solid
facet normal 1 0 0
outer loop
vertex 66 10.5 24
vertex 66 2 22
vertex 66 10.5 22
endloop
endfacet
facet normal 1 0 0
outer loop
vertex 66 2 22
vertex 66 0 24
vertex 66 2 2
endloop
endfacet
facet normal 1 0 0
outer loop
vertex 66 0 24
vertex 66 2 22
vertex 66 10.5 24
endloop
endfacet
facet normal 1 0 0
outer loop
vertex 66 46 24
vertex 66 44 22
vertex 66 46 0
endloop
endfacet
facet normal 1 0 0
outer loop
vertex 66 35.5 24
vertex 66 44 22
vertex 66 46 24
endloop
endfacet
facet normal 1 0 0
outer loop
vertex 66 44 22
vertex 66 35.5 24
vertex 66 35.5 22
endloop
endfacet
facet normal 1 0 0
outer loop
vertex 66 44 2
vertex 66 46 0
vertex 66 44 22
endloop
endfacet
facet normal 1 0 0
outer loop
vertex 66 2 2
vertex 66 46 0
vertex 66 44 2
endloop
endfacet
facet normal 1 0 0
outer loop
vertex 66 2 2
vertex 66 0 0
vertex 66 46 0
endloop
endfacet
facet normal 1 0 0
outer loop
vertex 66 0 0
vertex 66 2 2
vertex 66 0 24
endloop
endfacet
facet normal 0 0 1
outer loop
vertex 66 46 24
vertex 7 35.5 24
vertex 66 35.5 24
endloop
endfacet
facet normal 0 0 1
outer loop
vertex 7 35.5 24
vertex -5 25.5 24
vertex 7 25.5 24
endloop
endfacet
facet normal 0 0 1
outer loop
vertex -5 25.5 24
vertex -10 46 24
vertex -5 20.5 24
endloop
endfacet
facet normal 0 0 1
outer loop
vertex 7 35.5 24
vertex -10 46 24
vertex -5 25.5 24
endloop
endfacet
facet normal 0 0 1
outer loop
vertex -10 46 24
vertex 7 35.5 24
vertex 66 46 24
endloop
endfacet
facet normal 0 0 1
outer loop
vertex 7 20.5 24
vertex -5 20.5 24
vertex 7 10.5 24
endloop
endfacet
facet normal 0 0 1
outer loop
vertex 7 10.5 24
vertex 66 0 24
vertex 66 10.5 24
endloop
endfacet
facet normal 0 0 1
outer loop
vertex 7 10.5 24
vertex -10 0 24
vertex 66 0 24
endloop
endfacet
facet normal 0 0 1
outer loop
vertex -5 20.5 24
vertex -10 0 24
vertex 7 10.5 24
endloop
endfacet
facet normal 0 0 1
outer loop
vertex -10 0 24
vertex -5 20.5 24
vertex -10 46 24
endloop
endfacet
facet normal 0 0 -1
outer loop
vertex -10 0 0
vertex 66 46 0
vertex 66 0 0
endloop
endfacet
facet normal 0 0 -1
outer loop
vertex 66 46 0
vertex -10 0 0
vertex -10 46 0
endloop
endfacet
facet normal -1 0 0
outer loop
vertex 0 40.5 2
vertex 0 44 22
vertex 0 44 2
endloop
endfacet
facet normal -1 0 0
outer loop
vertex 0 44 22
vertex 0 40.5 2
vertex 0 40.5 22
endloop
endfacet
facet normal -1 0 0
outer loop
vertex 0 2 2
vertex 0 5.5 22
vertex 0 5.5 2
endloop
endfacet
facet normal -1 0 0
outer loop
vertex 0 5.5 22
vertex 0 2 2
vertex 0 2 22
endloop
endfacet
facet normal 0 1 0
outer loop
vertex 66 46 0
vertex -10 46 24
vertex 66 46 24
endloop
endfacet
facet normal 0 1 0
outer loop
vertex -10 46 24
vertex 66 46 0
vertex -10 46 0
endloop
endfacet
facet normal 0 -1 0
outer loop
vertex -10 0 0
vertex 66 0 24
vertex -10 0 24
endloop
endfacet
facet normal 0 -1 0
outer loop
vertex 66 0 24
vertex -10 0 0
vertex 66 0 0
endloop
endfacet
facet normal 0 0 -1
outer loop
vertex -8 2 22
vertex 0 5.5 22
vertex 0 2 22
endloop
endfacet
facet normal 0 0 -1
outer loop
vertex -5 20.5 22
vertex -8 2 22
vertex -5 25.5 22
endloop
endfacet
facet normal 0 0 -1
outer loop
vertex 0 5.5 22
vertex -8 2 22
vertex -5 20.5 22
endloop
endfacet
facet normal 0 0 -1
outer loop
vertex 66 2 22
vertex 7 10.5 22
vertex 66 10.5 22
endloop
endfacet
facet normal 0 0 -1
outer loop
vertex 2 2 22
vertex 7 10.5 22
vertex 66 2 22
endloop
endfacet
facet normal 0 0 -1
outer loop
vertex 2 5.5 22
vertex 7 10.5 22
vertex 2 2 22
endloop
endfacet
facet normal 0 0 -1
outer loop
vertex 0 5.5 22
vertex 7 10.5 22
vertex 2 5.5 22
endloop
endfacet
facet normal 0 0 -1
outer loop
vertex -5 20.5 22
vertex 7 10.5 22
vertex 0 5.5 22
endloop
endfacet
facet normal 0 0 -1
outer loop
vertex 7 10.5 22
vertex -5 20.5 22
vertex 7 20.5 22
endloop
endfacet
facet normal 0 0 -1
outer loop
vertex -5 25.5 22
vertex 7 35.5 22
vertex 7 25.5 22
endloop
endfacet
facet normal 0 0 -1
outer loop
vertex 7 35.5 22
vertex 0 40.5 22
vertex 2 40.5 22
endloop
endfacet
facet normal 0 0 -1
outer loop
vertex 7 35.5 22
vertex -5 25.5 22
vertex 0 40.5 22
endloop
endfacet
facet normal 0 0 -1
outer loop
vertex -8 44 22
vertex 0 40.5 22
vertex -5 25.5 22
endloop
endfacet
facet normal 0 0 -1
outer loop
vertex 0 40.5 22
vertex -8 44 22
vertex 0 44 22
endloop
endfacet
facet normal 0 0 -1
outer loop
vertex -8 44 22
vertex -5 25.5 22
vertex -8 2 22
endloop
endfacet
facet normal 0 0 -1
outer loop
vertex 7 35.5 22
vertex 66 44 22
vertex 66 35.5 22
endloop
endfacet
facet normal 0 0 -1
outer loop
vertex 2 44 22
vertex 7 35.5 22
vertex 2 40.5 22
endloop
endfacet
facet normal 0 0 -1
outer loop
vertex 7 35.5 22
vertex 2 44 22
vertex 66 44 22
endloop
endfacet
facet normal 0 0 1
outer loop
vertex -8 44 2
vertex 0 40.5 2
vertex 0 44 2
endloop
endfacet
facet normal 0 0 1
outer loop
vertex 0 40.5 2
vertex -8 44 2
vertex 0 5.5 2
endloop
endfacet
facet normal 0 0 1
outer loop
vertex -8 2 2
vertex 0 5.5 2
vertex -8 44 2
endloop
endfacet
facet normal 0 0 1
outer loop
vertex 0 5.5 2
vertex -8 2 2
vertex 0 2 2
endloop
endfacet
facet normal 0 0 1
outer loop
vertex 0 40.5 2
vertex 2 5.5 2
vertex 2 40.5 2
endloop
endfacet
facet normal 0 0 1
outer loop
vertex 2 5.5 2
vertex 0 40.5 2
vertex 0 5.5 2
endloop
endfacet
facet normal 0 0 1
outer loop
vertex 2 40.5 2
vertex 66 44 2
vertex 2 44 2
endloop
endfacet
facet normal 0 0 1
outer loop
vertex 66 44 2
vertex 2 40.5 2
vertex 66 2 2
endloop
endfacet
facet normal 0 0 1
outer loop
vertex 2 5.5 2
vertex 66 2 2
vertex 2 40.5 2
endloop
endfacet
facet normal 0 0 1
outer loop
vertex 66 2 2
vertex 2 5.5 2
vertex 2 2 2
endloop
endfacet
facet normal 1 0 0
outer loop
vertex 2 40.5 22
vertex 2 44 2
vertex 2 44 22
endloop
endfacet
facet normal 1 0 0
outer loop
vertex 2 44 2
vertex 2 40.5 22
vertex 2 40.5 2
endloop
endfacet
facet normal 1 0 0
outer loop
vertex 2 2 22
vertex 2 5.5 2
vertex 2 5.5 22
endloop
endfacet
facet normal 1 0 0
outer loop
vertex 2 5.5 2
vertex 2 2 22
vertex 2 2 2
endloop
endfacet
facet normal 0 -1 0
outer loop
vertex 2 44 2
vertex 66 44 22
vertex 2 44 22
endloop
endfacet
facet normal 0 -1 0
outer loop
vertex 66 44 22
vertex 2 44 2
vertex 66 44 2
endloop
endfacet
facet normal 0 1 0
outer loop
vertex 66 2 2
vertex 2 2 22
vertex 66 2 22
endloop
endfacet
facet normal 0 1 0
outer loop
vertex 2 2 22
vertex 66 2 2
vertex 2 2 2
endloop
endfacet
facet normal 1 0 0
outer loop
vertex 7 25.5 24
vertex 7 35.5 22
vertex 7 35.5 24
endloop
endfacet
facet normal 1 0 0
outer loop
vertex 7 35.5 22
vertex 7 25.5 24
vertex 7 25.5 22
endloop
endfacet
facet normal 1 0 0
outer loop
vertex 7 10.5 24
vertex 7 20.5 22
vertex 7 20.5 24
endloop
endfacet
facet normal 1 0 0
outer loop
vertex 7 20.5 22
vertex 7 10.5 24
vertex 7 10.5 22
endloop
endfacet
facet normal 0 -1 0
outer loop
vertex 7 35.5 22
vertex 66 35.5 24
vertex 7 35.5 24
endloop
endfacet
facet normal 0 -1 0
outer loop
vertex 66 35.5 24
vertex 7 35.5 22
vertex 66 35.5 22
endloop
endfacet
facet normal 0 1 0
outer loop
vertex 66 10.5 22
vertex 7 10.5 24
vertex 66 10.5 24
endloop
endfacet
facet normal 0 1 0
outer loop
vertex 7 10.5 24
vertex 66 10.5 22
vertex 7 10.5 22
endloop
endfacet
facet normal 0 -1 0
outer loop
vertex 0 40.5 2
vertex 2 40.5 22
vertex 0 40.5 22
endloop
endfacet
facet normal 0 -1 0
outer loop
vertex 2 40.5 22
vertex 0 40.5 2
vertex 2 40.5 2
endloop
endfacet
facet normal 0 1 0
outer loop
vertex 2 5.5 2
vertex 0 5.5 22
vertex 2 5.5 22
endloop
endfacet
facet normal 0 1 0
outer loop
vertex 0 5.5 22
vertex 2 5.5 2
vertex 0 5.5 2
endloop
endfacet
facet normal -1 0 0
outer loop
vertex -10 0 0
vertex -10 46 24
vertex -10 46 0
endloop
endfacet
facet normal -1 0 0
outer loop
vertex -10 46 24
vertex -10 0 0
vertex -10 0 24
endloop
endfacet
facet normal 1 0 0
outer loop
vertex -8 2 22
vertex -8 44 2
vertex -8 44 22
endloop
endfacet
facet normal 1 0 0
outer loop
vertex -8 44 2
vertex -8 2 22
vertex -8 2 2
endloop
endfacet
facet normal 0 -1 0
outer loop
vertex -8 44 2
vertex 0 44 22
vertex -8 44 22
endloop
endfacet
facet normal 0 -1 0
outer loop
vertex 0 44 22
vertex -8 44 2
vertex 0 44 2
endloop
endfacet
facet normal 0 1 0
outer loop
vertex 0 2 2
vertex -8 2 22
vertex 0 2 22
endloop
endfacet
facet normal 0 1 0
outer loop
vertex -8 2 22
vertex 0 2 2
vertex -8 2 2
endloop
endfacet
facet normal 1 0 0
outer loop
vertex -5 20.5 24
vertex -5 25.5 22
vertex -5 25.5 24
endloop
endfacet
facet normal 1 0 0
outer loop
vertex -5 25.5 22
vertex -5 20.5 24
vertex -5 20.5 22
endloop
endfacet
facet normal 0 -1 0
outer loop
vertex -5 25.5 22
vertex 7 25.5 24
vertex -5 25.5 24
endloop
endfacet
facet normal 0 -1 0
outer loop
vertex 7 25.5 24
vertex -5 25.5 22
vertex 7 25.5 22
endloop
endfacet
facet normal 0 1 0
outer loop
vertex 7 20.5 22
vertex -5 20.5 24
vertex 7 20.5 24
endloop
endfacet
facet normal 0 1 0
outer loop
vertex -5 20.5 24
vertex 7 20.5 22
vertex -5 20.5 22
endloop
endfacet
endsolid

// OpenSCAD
// file: ../_common/roundedcube.scad
// More information: https://danielupshaw.com/openscad-rounded-corners/
// Higher definition curves
$fs = 0.01;

module roundedcube(size = [1, 1, 1], center = false, radius = 0.5, apply_to = "all") {
	// If single value, convert to [x, y, z] vector
	size = (size[0] == undef) ? [size, size, size] : size;

	translate_min = radius;
	translate_xmax = size[0] - radius;
	translate_ymax = size[1] - radius;
	translate_zmax = size[2] - radius;

	diameter = radius * 2;

	module build_point(type = "sphere", rotate = [0, 0, 0]) {
		if (type == "sphere") {
			sphere(r = radius);
		} else if (type == "cylinder") {
			rotate(a = rotate)
			cylinder(h = diameter, r = radius, center = true);
		}
	}

	obj_translate = (center == false) ?
		[0, 0, 0] : [
			-(size[0] / 2),
			-(size[1] / 2),
			-(size[2] / 2)
		];

	translate(v = obj_translate) {
		hull() {
			for (translate_x = [translate_min, translate_xmax]) {
				x_at = (translate_x == translate_min) ? "min" : "max";
				for (translate_y = [translate_min, translate_ymax]) {
					y_at = (translate_y == translate_min) ? "min" : "max";
					for (translate_z = [translate_min, translate_zmax]) {
						z_at = (translate_z == translate_min) ? "min" : "max";

						translate(v = [translate_x, translate_y, translate_z])
						if (
							(apply_to == "all") ||
							(apply_to == "xmin" && x_at == "min") || (apply_to == "xmax" && x_at == "max") ||
							(apply_to == "ymin" && y_at == "min") || (apply_to == "ymax" && y_at == "max") ||
							(apply_to == "zmin" && z_at == "min") || (apply_to == "zmax" && z_at == "max")
						) {
							build_point("sphere");
						} else {
							rotate = 
								(apply_to == "xmin" || apply_to == "xmax" || apply_to == "x") ? [0, 90, 0] : (
								(apply_to == "ymin" || apply_to == "ymax" || apply_to == "y") ? [90, 90, 0] :
								[0, 0, 0]
							);
							build_point("cylinder", rotate);
						}
					}
				}
			}
		}
	}
}
// main file
// 60*15*40
// 20*30*3
use <../_common/roundedcube.scad>;

/*
roundedcube(
    [60,40,15],
    true, 3
);
*/

RH = 18;
RW = 40;
RL = 60;

OFF = 1;
BW = 2;
ICH = 5;

HW = 25;
HL = 10;
WW = 5;

MAR=OFF*2+BW*2;

module remote(l=0,w=0,h=0) {
    cube([RL+l,RW+w,RH+h]);
}

module case_remote() {
    difference() {
        // box for the case
        cube([RL+MAR,RW+MAR,RH+MAR]);
        // hole for remote
        translate([BW,BW,BW])
            remote(l=500,w=OFF*2,h=OFF*2);
        // top hole to view remote
        translate([7,(RW+MAR-HW)/2,RH+BW])
            cube([RL+MAR,HW,BW*3]);
        // hole for IC
        translate([-BW,BW+OFF+2.5,BW])
            cube([RL,35,RH+OFF*2]);
    }
}

module case_ic() {
    difference() {
        cube([HL,RW+MAR,RH+MAR]);
        translate([BW,BW,BW])
            cube([RL,RW+OFF*2,RH+OFF*2]);
    }
}

module case() {
    difference() {        
        union() {
            case_remote();
            translate([-HL,0,0])
                case_ic();
        }
        // wire hole
        translate([-WW,(RW+MAR-WW)/2,RH+BW])
            cube([HL+HL,WW,BW*3]);
    }
}

// remote placeholder, for reference
//color("grey") translate([BW+OFF,BW+OFF,BW+OFF]) remote();

// size test
//difference() { case(); translate([20,-5,-50]) cube([100, 100, 100]);}

color("green") case();
